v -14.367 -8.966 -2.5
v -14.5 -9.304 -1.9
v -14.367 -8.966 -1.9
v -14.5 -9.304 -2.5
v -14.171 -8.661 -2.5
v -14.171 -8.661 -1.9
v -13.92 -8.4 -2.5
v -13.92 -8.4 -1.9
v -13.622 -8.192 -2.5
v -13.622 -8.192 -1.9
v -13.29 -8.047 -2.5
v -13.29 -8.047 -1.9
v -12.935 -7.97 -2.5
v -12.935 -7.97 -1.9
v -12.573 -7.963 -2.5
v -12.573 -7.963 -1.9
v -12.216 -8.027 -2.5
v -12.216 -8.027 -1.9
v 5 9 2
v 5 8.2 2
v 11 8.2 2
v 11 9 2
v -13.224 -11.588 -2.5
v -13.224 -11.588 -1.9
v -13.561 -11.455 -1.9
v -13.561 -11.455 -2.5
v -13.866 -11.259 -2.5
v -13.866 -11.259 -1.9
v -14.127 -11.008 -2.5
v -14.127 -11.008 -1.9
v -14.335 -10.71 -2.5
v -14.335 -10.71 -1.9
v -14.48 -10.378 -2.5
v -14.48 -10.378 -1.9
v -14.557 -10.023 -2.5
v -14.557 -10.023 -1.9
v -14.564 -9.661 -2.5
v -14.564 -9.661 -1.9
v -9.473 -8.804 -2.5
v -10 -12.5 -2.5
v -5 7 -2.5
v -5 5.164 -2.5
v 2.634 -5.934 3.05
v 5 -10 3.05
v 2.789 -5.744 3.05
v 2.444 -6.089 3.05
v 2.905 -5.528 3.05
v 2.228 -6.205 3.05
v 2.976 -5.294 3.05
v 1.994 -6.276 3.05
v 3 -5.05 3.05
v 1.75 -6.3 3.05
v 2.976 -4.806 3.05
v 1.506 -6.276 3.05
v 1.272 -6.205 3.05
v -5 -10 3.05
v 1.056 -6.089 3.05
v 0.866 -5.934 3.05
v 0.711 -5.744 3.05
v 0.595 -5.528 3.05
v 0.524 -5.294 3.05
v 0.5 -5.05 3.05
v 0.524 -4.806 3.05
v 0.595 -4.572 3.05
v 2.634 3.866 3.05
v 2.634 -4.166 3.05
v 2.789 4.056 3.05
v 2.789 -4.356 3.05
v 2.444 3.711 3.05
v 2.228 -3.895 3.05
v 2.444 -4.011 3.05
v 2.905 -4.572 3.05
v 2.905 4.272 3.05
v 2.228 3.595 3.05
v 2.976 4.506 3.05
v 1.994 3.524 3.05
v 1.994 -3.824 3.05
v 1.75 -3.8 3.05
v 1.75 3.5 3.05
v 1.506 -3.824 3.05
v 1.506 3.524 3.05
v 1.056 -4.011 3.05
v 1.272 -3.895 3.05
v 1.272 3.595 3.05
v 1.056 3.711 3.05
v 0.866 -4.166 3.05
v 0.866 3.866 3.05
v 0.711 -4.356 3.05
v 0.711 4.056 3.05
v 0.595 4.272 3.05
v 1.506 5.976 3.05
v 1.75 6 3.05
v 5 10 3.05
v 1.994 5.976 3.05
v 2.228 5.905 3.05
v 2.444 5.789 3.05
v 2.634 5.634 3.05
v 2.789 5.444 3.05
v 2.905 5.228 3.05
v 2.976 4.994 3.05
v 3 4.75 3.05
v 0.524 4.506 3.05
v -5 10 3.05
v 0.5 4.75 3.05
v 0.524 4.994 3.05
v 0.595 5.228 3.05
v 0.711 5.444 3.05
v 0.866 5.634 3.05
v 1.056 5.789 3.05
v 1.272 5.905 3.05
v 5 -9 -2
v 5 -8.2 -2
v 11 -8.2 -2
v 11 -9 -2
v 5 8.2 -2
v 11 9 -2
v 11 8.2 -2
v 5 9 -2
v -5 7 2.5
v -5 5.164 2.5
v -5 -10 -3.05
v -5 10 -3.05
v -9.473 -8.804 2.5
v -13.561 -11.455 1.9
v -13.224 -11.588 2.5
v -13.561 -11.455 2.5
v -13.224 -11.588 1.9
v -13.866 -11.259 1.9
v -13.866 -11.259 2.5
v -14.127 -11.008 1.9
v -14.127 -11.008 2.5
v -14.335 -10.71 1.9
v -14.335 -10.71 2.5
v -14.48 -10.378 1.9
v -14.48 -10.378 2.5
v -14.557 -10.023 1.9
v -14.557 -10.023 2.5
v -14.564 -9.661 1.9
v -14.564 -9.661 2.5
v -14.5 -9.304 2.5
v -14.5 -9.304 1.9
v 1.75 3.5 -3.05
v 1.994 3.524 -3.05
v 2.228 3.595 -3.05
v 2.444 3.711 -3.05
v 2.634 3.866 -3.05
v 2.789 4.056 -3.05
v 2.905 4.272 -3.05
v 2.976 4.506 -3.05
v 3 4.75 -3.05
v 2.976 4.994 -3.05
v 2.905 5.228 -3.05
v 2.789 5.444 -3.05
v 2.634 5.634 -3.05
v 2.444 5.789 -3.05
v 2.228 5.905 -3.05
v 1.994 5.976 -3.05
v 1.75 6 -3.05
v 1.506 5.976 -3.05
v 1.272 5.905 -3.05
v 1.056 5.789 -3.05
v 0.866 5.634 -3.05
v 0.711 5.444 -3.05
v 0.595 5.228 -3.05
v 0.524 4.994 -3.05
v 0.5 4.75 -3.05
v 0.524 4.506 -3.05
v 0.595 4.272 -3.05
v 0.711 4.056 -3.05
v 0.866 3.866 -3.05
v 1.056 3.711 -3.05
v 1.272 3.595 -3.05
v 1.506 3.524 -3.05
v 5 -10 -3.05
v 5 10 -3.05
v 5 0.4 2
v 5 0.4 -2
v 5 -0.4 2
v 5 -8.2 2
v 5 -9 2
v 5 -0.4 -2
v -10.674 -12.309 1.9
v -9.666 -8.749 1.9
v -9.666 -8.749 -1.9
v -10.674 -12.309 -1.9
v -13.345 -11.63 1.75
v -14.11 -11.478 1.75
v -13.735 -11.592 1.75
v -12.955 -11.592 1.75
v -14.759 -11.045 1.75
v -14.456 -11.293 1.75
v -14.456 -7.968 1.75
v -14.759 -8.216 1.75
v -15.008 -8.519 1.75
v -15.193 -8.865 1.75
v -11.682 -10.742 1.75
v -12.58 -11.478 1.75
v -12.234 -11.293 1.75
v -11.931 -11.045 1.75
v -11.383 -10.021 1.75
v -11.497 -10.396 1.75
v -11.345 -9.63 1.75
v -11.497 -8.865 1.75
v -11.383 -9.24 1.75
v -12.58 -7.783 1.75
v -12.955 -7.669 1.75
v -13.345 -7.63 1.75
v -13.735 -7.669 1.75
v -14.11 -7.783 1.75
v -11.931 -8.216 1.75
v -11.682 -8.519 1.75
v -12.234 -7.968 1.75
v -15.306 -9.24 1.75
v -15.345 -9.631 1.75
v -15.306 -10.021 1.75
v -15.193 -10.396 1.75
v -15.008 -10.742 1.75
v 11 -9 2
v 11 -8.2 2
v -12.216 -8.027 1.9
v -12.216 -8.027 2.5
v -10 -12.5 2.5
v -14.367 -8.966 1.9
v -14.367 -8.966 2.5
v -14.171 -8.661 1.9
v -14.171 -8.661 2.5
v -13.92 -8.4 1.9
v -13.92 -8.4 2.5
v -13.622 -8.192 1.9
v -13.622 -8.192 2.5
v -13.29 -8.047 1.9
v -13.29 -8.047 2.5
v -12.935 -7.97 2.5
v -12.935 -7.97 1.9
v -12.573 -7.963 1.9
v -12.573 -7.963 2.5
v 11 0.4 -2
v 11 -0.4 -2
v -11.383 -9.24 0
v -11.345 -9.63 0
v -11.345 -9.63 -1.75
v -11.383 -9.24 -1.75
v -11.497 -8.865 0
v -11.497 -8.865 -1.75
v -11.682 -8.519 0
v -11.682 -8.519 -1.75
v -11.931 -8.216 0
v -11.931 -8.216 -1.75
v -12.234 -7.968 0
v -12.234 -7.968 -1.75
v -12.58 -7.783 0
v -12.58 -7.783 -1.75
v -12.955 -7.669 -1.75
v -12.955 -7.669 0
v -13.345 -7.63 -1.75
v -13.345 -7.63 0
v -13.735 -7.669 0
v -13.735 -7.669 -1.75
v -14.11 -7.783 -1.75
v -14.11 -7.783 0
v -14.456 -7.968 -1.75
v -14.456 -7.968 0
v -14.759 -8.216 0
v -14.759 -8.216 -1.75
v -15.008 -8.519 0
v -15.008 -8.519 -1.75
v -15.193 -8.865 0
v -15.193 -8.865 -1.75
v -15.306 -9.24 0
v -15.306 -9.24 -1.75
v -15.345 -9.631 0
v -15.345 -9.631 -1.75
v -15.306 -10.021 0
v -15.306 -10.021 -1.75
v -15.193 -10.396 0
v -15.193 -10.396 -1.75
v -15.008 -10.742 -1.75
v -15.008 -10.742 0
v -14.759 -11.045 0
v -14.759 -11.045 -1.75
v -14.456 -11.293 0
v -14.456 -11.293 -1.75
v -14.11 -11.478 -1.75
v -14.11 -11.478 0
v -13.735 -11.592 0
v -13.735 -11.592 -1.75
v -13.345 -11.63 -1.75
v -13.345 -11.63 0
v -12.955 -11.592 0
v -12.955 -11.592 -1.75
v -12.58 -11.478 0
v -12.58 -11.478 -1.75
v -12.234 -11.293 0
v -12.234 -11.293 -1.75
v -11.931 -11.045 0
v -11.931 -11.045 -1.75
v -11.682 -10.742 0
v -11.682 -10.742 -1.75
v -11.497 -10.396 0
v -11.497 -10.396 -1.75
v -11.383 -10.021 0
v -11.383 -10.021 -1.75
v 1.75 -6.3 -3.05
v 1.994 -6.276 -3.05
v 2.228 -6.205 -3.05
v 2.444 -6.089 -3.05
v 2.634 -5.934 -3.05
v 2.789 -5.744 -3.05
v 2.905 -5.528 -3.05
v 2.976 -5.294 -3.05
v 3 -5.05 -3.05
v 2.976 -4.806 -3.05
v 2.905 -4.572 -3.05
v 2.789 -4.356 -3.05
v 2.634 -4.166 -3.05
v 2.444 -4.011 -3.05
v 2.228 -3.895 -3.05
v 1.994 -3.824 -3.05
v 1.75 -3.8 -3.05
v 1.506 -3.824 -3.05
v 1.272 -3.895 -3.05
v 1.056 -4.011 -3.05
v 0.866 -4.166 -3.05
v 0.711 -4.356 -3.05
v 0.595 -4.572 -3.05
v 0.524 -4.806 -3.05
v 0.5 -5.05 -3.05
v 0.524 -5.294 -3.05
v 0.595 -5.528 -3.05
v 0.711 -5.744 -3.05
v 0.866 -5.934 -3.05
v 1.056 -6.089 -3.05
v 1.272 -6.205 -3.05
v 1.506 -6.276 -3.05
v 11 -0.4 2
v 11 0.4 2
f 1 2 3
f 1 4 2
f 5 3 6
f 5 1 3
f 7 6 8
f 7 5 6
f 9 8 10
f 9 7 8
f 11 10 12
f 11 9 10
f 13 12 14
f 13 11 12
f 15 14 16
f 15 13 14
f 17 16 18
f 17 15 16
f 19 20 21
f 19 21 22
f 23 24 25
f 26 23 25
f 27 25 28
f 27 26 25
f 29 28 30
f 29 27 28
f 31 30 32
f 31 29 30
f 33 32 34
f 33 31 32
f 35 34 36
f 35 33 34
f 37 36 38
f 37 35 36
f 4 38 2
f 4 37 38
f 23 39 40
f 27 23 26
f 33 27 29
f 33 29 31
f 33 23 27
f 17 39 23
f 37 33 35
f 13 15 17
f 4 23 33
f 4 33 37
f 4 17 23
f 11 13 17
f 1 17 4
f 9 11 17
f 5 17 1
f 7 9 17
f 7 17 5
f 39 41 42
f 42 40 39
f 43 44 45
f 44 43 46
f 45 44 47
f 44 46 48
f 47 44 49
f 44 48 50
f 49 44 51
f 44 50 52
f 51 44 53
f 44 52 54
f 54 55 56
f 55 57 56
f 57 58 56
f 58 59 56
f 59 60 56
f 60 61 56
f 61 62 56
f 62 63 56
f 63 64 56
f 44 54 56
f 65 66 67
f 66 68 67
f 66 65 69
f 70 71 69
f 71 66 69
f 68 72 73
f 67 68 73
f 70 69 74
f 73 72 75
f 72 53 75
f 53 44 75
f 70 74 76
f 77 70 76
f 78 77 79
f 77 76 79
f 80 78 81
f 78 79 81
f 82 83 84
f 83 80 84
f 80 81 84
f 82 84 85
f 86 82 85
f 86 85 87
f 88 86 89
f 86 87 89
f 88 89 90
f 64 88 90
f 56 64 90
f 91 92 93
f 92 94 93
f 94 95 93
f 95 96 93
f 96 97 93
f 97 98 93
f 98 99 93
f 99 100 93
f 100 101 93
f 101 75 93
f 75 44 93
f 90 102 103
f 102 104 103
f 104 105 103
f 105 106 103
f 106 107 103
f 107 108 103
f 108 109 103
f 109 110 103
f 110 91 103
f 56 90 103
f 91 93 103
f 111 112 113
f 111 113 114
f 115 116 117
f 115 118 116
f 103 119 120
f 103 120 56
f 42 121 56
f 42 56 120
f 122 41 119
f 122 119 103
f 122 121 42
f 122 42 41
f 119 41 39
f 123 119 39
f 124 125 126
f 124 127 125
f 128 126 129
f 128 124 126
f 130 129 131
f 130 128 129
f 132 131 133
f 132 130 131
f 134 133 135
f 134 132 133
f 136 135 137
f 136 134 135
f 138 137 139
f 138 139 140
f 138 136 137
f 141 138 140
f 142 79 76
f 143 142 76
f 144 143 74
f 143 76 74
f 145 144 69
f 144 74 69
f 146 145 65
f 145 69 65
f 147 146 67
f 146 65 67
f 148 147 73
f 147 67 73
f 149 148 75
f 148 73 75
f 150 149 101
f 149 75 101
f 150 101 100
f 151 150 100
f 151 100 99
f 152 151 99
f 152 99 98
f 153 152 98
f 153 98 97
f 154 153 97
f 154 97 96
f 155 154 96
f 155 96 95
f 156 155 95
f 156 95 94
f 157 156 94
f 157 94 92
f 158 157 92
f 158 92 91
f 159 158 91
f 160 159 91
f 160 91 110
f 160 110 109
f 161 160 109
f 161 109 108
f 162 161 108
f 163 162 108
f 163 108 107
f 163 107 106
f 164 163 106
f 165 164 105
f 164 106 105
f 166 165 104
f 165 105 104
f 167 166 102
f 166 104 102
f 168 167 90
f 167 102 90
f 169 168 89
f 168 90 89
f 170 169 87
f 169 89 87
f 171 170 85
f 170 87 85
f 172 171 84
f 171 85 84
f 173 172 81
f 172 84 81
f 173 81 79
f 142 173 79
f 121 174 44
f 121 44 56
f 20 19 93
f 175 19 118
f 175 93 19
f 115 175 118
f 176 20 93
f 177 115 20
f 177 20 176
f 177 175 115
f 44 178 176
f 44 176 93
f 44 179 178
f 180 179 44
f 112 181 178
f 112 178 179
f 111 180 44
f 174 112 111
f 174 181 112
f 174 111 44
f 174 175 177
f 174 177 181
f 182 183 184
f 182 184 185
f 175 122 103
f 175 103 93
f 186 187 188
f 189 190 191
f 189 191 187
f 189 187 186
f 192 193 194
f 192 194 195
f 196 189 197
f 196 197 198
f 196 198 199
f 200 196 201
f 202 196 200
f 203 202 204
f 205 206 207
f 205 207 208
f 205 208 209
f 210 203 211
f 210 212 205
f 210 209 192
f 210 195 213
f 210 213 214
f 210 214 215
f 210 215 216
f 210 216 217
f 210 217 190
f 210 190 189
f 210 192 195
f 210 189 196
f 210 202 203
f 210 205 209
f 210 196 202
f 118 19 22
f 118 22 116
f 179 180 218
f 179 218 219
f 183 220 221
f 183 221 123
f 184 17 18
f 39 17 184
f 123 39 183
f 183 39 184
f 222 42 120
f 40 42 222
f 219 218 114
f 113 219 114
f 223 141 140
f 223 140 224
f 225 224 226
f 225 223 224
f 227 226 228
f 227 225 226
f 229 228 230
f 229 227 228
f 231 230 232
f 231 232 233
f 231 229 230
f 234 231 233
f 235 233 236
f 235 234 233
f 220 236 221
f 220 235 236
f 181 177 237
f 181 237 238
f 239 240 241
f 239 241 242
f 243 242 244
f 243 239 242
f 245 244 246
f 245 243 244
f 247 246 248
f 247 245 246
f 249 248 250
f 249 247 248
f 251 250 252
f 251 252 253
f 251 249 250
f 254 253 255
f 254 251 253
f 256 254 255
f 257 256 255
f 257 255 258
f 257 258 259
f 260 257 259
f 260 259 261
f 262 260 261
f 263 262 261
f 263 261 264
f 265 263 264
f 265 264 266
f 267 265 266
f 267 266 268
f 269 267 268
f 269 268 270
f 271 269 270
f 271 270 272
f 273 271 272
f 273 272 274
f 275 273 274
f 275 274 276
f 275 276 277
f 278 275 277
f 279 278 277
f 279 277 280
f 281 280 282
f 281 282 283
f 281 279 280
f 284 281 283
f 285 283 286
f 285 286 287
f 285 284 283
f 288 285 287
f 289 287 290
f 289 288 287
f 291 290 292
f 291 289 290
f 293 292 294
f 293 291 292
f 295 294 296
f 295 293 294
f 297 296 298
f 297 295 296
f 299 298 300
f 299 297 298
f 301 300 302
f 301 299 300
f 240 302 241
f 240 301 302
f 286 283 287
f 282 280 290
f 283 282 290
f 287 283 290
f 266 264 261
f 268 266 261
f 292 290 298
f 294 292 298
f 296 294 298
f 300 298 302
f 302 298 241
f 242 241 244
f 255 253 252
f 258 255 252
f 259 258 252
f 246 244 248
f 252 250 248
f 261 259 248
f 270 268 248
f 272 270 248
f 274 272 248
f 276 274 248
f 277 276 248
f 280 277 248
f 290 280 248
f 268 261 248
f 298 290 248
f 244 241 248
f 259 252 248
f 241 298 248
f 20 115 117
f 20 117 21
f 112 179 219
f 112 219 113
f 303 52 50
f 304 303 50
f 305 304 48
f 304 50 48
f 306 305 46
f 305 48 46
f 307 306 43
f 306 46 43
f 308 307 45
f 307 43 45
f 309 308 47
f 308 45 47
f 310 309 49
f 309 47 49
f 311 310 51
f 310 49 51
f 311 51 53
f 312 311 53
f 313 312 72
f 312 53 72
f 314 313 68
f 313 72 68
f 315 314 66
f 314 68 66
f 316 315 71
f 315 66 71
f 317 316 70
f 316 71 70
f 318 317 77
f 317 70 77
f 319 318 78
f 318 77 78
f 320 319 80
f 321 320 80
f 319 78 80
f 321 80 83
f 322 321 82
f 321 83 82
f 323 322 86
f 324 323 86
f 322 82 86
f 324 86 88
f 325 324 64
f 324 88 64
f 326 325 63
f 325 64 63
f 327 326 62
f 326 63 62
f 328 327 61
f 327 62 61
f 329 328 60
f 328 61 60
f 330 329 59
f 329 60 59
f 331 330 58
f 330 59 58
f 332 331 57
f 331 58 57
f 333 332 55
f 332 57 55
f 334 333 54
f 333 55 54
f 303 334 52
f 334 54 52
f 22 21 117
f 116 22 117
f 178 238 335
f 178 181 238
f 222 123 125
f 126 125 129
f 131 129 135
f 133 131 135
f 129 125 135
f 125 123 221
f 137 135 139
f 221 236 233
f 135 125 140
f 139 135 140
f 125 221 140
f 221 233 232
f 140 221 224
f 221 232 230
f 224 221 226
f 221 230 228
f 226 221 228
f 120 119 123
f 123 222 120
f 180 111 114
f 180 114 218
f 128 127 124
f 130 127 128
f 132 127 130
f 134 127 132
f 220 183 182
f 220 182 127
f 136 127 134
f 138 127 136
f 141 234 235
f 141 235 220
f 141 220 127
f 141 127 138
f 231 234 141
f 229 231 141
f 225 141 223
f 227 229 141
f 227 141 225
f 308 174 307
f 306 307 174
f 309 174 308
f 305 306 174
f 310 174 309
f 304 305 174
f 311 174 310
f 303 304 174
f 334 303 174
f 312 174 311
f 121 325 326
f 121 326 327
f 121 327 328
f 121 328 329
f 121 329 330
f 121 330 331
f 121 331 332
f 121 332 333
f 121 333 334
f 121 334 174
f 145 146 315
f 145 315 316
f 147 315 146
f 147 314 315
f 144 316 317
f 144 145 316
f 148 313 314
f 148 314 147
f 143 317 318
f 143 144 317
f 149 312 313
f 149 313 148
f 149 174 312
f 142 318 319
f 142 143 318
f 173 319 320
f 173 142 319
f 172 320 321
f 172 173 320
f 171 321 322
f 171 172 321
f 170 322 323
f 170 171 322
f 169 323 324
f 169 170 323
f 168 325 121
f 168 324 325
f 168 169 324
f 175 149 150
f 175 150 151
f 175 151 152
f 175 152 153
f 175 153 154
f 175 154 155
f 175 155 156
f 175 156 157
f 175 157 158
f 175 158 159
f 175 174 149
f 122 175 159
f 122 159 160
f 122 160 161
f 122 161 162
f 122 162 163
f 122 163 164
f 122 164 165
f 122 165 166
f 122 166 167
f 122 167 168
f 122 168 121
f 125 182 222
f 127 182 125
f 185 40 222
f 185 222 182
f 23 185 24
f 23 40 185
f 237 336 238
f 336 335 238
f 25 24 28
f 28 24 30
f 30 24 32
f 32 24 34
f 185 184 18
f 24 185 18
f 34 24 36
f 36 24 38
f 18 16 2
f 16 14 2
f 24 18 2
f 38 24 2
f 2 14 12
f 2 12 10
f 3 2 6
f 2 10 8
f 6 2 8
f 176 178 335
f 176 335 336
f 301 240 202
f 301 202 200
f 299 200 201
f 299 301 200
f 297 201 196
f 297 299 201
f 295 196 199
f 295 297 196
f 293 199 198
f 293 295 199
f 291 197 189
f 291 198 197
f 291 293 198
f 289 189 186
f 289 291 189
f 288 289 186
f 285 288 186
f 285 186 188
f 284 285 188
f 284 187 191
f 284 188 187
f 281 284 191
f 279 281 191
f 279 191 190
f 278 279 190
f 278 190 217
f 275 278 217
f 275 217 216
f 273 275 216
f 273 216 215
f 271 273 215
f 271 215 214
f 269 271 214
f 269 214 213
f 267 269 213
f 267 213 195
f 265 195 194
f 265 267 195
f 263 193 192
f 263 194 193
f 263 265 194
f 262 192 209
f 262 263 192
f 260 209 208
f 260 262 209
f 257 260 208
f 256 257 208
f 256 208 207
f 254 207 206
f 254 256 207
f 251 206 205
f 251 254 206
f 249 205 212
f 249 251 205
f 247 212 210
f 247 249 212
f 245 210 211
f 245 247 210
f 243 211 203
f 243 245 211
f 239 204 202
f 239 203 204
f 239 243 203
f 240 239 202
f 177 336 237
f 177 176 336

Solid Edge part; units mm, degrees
sketch "Sketch1" plane through (0, 0, 0) normal (0, 0, 1) x (1, 0, 0)
  line L0 (-5, 10) -> (5, 10)
  line L1 (5, 10) -> (5, -10)
  line L2 (5, -10) -> (-5, -10)
  line L3 (-5, -10) -> (-5, 10)
  dimension "D1" = 10
  dimension "D2" = 20
extrude "Protrusion1" add sketch "Sketch1" along normal mid plane 6.1
sketch "Sketch2" plane through (0, 0, 0) normal (0, 0, 1) x (1, 0, 0)
  line L0 (-5, 5.1642) -> (-10, -12.5)
  line L1 (-10, -12.5) -> (-15.0034, -11.0837)
  line L2 (-15.0034, -11.0837) -> (-13.9957, -7.5236)
  line L3 (-13.9957, -7.5236) -> (-9.4734, -8.8037)
  line L4 (-5, 7) -> (-9.4734, -8.8037)
  line L5 (-5, 7) -> (-5, 5.1642)
  dimension "D1" = 0.5
  dimension "D2" = 5
  dimension "D3" = 5.2
  dimension "D4" = 3.7
  dimension "D5" = 3
  dimension "D6" = 19.5
  dimension "D7" = 2.5
extrude "Extrusionsausprägung_2" add sketch "Sketch2" along normal mid plane 5
sketch "Sketch3" plane through (0, 0, 0) normal (0, 0, 1) x (1, 0, 0)
  line L0 (-9.6658, -8.7492) -> (-10.6735, -12.3093)
  line L1 (-10.6735, -12.3093) -> (-15.0034, -11.0837)
  line L2 (-15.0034, -11.0837) -> (-13.9957, -7.5236)
  line L3 (-13.9957, -7.5236) -> (-9.6658, -8.7492)
  dimension "D1" = 4.5
extrude "Extrusionsausschnitt_1" cut sketch "Sketch3" along normal mid plane 3.8
sketch "Sketch4" plane through (0, 0, 0) normal (0, 0, 1) x (1, 0, 0)
  circle A0 centre (-13.3449, -9.6305) radius 2
  dimension "D1" = 4
  dimension "D2" = 4
  dimension "D3" = 1.85
extrude "Extrusionsausprägung_3" add sketch "Sketch4" along normal mid plane 3.5
fillet "Verrundung_1" radius 1.85 4 edges at (-13.9957, -7.5236, 2.2) (-13.9957, -7.5236, -2.2) (-15.0034, -11.0837, 2.2) (-15.0034, -11.0837, -2.2)
hole "Bohrung_1" at (1.75, 4.75, 3.05) direction (0, 0, -1) diameter 2.5 end up to next
hole "Hole1" at (1.75, -5.05, 3.05) direction (0, 0, -1) diameter 2.5 end up to next
sketch "Sketch5" plane through (5, 0, 0) normal (1, 0, 0) x (0, -1, 0)
  line L0 (-9, 2) -> (-8.2, 2)
  line L1 (-8.2, 2) -> (-8.2, -2)
  line L2 (-8.2, -2) -> (-9, -2)
  line L3 (-9, -2) -> (-9, 2)
  line L4 (-0.4, 2) -> (0.4, 2)
  line L5 (0.4, 2) -> (0.4, -2)
  line L6 (0.4, -2) -> (-0.4, -2)
  line L7 (-0.4, -2) -> (-0.4, 2)
  line L8 (8.2, 2) -> (9, 2)
  line L9 (9, 2) -> (9, -2)
  line L10 (9, -2) -> (8.2, -2)
  line L11 (8.2, -2) -> (8.2, 2)
  dimension "D1" = 1
  dimension "D2" = 0.8
  dimension "D3" = 0.8
  dimension "D4" = 1
  dimension "D5" = 0.8
  dimension "D6" = 4
extrude "Extrusionsausprägung_4" add sketch "Sketch5" along normal blind 6
